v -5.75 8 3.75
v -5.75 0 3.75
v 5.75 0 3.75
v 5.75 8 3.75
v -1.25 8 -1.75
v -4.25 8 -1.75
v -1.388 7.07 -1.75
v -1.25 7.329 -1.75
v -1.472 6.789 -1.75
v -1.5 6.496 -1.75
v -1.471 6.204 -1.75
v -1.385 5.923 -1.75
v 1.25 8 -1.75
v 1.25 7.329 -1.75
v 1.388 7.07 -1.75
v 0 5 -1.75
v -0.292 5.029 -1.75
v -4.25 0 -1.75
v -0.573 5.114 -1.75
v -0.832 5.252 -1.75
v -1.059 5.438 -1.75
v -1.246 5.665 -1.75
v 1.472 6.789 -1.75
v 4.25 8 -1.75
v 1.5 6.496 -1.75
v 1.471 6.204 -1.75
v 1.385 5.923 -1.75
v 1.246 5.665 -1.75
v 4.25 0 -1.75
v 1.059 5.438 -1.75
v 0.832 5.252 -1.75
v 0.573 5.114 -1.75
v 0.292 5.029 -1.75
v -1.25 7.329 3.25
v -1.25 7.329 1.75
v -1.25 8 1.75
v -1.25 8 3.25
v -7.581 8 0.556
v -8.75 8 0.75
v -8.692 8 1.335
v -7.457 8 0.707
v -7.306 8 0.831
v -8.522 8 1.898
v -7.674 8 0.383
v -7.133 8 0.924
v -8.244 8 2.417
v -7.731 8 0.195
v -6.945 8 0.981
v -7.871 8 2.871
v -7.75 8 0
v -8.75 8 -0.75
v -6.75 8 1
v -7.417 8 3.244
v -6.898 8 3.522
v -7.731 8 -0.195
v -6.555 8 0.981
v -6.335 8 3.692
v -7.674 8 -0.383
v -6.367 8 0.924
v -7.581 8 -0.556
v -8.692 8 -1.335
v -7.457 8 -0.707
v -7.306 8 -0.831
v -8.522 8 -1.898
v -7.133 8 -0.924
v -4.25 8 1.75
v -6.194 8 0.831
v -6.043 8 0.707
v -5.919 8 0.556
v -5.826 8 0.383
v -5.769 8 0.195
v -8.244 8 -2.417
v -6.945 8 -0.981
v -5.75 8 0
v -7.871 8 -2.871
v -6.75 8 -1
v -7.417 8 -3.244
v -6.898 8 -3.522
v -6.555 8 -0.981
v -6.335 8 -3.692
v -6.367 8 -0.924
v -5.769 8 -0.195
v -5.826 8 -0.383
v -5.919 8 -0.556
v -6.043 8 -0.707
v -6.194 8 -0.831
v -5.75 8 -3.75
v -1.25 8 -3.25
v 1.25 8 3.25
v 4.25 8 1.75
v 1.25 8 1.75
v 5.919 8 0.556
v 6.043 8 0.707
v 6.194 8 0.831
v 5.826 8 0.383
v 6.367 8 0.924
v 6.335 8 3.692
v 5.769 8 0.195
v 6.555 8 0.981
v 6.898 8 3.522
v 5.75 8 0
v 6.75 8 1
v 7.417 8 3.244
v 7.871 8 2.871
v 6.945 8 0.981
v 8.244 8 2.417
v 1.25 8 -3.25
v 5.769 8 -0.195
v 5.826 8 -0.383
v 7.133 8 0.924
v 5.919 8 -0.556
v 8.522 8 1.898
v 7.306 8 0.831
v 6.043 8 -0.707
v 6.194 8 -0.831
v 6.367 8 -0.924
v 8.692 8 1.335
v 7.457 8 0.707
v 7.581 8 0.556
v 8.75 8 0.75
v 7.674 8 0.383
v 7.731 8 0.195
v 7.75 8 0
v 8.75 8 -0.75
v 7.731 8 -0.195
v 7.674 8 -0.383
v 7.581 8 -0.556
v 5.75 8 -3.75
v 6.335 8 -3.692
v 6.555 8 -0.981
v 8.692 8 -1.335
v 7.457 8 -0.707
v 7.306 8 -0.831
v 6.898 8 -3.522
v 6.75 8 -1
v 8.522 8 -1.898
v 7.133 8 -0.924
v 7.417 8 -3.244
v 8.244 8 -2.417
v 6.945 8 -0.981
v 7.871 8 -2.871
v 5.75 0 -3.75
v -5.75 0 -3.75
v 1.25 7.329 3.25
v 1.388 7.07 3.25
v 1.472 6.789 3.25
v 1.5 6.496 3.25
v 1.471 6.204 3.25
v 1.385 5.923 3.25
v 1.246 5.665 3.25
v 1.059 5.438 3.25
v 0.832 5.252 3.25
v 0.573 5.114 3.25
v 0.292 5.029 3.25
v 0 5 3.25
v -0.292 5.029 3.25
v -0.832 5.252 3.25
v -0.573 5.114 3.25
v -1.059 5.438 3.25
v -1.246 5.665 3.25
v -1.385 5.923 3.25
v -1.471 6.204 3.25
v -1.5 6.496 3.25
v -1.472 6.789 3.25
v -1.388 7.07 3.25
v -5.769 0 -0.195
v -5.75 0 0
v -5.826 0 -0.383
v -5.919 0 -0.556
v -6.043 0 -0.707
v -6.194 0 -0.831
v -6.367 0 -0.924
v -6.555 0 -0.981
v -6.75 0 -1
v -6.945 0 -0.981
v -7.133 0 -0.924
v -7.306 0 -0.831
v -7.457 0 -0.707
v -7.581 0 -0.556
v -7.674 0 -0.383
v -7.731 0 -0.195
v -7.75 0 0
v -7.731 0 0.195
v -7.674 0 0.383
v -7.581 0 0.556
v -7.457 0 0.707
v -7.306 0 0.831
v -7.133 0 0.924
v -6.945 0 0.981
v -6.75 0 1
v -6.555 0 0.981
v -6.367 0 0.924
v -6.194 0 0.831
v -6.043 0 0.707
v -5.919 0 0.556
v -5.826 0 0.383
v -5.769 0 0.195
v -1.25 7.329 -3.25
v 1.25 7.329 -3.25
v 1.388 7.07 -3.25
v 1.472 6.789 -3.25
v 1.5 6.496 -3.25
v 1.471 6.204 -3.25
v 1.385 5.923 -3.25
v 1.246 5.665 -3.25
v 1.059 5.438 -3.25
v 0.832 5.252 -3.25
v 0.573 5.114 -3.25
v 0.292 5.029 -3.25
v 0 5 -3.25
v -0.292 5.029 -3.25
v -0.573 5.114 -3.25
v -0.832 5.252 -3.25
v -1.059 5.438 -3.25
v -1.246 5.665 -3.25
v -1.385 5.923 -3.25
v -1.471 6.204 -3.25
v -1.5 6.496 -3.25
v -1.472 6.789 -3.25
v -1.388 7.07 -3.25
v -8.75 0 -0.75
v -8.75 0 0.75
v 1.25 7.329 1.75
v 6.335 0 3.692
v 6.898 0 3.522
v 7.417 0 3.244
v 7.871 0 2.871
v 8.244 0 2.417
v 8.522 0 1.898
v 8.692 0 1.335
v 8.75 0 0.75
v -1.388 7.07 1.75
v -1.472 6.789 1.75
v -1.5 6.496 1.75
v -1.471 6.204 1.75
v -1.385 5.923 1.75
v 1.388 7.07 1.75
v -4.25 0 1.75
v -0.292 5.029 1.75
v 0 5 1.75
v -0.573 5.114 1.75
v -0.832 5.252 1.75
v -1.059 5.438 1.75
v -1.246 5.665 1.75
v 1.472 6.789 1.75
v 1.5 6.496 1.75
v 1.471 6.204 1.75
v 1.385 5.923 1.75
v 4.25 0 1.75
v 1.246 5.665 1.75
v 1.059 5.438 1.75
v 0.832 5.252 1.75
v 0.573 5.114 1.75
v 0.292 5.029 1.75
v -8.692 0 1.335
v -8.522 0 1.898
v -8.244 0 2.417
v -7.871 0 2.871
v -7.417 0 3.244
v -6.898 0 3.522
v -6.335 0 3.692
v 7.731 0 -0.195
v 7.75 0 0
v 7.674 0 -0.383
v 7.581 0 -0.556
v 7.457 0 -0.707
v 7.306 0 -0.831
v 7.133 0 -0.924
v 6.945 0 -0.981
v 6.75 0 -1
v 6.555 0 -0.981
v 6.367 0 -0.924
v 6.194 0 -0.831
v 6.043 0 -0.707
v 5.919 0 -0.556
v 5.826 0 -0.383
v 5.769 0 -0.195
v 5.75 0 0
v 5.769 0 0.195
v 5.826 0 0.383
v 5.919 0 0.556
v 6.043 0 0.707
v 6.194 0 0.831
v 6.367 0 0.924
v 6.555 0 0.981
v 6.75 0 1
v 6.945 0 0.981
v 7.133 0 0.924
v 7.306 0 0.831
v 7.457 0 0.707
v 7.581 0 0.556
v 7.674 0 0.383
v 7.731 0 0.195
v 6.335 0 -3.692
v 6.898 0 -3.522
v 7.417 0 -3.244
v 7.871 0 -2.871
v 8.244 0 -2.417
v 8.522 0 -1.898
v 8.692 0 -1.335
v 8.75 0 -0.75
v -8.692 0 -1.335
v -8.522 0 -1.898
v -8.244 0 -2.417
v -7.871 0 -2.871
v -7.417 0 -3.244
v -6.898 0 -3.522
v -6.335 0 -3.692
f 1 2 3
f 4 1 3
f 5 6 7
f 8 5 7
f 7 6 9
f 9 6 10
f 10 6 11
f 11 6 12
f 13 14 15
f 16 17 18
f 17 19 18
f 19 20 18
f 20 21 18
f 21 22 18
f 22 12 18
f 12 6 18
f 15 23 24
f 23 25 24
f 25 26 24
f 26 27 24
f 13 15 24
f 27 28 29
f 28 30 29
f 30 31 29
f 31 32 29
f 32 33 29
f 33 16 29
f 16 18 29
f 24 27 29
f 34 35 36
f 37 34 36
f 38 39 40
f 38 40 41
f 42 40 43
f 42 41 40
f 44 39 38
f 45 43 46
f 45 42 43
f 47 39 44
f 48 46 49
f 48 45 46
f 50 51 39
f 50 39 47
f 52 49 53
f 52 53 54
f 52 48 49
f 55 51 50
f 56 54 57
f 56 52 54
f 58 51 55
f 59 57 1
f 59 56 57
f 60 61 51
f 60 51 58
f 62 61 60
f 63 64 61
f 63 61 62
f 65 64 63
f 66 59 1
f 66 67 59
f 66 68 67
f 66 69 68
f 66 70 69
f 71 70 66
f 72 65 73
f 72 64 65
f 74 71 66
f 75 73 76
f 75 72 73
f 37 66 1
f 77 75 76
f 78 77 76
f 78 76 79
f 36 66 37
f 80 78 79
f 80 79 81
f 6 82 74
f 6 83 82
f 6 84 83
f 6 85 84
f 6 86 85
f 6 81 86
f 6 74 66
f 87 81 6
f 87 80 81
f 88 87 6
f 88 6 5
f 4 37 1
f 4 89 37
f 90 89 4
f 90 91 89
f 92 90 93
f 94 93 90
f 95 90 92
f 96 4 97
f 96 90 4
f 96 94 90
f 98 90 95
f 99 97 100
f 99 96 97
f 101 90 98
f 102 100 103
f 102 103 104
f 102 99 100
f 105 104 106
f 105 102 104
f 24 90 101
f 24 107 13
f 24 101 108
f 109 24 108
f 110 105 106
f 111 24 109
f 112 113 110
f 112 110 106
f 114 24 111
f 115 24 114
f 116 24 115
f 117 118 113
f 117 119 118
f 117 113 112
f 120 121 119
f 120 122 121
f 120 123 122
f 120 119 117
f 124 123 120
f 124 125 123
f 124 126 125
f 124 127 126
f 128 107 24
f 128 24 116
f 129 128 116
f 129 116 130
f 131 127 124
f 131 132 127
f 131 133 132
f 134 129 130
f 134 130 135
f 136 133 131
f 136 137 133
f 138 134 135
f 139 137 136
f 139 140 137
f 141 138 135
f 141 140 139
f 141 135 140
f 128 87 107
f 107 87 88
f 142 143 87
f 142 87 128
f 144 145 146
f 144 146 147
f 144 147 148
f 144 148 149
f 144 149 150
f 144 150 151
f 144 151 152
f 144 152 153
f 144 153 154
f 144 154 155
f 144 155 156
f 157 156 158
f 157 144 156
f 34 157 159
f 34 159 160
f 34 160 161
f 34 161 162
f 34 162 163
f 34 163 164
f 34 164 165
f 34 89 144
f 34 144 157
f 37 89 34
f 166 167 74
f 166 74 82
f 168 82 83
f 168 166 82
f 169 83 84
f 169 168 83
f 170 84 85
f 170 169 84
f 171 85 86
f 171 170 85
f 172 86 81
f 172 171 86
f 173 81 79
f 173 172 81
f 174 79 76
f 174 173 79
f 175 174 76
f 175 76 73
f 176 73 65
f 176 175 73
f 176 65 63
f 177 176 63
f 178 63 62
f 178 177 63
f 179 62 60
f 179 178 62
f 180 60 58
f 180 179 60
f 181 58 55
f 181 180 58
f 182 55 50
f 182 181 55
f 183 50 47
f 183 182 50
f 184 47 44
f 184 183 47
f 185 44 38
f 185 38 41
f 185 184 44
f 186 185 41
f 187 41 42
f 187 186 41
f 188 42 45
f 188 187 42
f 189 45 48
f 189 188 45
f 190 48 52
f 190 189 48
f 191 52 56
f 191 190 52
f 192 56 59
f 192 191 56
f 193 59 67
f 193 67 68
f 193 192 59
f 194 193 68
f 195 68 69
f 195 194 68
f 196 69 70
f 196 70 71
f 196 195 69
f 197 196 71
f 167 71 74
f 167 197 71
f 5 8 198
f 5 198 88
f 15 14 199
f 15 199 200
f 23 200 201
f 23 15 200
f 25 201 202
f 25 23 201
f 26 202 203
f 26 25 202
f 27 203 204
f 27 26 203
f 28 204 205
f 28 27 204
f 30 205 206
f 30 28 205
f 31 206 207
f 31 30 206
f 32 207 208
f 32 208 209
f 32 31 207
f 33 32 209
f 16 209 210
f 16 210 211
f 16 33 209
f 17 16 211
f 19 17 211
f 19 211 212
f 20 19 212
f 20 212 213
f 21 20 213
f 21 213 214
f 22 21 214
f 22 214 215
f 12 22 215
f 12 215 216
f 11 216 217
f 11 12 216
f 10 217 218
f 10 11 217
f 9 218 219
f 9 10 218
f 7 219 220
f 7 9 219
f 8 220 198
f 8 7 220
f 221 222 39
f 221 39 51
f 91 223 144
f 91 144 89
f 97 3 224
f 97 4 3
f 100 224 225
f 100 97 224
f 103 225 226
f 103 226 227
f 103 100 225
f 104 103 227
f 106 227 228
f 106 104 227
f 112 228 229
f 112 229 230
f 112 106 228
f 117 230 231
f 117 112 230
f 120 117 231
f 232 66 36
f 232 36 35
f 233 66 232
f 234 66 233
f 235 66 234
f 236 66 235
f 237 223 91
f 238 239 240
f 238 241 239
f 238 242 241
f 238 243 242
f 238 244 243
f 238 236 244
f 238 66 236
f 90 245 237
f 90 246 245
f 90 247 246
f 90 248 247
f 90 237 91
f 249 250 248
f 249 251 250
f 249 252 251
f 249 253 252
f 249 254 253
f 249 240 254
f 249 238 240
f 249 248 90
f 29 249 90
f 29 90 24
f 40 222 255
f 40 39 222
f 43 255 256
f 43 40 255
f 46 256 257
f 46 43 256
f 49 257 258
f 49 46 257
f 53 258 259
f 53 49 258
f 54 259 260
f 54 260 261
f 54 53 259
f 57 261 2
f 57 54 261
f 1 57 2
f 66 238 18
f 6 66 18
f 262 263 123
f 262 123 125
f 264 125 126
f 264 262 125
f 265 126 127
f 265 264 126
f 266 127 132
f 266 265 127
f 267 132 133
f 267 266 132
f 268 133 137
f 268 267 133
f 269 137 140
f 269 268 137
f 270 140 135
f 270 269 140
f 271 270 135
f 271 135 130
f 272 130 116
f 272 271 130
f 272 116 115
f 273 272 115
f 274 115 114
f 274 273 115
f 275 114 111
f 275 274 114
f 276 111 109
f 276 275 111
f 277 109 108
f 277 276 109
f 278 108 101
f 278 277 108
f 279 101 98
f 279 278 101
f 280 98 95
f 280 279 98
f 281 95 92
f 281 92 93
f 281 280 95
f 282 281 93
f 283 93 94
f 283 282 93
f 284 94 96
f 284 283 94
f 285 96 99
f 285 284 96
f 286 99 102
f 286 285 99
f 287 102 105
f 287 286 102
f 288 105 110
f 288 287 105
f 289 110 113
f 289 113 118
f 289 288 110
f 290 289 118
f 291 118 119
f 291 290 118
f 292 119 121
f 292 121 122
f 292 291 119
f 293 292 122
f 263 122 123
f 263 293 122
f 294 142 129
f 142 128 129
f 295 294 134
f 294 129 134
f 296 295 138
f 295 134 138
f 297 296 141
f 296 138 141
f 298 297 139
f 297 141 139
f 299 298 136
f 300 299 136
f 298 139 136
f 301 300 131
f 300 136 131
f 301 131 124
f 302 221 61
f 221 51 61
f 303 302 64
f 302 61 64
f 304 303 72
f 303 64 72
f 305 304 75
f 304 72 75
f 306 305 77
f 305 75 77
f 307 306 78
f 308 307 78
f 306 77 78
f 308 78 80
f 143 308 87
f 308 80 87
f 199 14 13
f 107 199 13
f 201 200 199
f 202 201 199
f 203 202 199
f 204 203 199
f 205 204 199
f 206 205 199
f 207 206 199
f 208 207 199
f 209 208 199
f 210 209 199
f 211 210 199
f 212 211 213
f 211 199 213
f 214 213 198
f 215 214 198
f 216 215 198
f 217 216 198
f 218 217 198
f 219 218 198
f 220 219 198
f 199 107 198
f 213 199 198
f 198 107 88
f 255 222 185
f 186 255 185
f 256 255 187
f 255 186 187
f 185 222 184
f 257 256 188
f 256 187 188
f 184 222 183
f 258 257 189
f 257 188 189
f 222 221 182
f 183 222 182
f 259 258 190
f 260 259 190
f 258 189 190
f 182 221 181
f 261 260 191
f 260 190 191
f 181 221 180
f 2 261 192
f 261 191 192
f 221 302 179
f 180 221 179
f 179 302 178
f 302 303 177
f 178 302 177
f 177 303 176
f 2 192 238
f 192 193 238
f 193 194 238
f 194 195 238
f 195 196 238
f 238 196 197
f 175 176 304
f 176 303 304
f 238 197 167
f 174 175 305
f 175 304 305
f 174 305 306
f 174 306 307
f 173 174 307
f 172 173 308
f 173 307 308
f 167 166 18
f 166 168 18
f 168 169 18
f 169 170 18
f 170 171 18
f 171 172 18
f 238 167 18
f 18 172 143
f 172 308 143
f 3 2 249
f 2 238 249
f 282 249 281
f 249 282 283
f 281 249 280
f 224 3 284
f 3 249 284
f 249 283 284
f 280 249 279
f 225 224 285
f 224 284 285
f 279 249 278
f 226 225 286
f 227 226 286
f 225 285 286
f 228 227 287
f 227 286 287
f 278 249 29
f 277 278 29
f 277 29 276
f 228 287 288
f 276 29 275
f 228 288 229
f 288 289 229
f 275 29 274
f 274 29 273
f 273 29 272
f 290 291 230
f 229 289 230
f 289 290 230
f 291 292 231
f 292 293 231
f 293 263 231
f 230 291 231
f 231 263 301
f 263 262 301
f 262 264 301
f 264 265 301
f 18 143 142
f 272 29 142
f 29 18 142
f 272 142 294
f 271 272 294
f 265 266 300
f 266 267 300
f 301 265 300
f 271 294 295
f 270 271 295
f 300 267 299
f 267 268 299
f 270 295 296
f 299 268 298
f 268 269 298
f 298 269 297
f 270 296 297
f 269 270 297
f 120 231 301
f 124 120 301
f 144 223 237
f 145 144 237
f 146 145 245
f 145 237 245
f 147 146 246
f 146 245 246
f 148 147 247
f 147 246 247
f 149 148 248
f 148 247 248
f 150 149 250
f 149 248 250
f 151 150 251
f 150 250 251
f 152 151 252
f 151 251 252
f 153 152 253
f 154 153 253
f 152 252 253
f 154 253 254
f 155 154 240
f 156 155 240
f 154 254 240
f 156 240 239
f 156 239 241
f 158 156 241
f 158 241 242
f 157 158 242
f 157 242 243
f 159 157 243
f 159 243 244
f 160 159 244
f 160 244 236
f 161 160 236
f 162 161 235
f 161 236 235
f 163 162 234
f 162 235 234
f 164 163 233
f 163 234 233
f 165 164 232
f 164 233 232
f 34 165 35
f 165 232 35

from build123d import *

# Parameters (mm, degrees)
SKETCH1_W           = 17.5
SKETCH1_H           = 7.5
SKETCH1_R           = 1
SKETCH1_W_2         = 8.5
SKETCH1_H_2         = 3.5
BOSS_EXTRUDE1_DEPTH = 8
FILLET1_R           = 3
SKETCH3_R           = 1.5
SKETCH3_W           = 2.5
SKETCH3_H           = 1.5
CUT_EXTRUDE1_DEPTH  = 1.5


with BuildPart() as part:
    # Sketch1 → Boss-Extrude1 (new body)
    with BuildSketch(Plane(origin=(0, 0, 0), x_dir=(1, 0, 0), z_dir=(0, 1, 0))):
        Rectangle(SKETCH1_W, SKETCH1_H)
        with Locations((-6.75, 0)):
            Circle(SKETCH1_R, mode=Mode.SUBTRACT)
        with Locations((6.75, 0)):
            Circle(SKETCH1_R, mode=Mode.SUBTRACT)
        Rectangle(SKETCH1_W_2, SKETCH1_H_2, mode=Mode.SUBTRACT)
    extrude(amount=BOSS_EXTRUDE1_DEPTH)

    # Fillet1
    fillet1_edges = [part.edges().sort_by_distance(p)[0] for p in [
        (8.75, 4, 3.75),
        (-8.75, 4, 3.75),
        (-8.75, 4, -3.75),
        (8.75, 4, -3.75),
    ]]
    fillet(fillet1_edges, radius=FILLET1_R)

    # Sketch3 → Cut-Extrude1 (cut)
    with BuildSketch(Plane(origin=(0, 0, 1.75), x_dir=(-1, 0, 0), z_dir=(0, 0, -1))):
        with Locations((0, 6.5)):
            Circle(SKETCH3_R)
        with Locations((0, 7.25)):
            Rectangle(SKETCH3_W, SKETCH3_H)
    cut_extrude1 = extrude(amount=-CUT_EXTRUDE1_DEPTH, mode=Mode.SUBTRACT)

    # Mirror1: Cut-Extrude1 across plane
    add(cut_extrude1.mirror(Plane.XY), mode=Mode.SUBTRACT)


solid = part.part
